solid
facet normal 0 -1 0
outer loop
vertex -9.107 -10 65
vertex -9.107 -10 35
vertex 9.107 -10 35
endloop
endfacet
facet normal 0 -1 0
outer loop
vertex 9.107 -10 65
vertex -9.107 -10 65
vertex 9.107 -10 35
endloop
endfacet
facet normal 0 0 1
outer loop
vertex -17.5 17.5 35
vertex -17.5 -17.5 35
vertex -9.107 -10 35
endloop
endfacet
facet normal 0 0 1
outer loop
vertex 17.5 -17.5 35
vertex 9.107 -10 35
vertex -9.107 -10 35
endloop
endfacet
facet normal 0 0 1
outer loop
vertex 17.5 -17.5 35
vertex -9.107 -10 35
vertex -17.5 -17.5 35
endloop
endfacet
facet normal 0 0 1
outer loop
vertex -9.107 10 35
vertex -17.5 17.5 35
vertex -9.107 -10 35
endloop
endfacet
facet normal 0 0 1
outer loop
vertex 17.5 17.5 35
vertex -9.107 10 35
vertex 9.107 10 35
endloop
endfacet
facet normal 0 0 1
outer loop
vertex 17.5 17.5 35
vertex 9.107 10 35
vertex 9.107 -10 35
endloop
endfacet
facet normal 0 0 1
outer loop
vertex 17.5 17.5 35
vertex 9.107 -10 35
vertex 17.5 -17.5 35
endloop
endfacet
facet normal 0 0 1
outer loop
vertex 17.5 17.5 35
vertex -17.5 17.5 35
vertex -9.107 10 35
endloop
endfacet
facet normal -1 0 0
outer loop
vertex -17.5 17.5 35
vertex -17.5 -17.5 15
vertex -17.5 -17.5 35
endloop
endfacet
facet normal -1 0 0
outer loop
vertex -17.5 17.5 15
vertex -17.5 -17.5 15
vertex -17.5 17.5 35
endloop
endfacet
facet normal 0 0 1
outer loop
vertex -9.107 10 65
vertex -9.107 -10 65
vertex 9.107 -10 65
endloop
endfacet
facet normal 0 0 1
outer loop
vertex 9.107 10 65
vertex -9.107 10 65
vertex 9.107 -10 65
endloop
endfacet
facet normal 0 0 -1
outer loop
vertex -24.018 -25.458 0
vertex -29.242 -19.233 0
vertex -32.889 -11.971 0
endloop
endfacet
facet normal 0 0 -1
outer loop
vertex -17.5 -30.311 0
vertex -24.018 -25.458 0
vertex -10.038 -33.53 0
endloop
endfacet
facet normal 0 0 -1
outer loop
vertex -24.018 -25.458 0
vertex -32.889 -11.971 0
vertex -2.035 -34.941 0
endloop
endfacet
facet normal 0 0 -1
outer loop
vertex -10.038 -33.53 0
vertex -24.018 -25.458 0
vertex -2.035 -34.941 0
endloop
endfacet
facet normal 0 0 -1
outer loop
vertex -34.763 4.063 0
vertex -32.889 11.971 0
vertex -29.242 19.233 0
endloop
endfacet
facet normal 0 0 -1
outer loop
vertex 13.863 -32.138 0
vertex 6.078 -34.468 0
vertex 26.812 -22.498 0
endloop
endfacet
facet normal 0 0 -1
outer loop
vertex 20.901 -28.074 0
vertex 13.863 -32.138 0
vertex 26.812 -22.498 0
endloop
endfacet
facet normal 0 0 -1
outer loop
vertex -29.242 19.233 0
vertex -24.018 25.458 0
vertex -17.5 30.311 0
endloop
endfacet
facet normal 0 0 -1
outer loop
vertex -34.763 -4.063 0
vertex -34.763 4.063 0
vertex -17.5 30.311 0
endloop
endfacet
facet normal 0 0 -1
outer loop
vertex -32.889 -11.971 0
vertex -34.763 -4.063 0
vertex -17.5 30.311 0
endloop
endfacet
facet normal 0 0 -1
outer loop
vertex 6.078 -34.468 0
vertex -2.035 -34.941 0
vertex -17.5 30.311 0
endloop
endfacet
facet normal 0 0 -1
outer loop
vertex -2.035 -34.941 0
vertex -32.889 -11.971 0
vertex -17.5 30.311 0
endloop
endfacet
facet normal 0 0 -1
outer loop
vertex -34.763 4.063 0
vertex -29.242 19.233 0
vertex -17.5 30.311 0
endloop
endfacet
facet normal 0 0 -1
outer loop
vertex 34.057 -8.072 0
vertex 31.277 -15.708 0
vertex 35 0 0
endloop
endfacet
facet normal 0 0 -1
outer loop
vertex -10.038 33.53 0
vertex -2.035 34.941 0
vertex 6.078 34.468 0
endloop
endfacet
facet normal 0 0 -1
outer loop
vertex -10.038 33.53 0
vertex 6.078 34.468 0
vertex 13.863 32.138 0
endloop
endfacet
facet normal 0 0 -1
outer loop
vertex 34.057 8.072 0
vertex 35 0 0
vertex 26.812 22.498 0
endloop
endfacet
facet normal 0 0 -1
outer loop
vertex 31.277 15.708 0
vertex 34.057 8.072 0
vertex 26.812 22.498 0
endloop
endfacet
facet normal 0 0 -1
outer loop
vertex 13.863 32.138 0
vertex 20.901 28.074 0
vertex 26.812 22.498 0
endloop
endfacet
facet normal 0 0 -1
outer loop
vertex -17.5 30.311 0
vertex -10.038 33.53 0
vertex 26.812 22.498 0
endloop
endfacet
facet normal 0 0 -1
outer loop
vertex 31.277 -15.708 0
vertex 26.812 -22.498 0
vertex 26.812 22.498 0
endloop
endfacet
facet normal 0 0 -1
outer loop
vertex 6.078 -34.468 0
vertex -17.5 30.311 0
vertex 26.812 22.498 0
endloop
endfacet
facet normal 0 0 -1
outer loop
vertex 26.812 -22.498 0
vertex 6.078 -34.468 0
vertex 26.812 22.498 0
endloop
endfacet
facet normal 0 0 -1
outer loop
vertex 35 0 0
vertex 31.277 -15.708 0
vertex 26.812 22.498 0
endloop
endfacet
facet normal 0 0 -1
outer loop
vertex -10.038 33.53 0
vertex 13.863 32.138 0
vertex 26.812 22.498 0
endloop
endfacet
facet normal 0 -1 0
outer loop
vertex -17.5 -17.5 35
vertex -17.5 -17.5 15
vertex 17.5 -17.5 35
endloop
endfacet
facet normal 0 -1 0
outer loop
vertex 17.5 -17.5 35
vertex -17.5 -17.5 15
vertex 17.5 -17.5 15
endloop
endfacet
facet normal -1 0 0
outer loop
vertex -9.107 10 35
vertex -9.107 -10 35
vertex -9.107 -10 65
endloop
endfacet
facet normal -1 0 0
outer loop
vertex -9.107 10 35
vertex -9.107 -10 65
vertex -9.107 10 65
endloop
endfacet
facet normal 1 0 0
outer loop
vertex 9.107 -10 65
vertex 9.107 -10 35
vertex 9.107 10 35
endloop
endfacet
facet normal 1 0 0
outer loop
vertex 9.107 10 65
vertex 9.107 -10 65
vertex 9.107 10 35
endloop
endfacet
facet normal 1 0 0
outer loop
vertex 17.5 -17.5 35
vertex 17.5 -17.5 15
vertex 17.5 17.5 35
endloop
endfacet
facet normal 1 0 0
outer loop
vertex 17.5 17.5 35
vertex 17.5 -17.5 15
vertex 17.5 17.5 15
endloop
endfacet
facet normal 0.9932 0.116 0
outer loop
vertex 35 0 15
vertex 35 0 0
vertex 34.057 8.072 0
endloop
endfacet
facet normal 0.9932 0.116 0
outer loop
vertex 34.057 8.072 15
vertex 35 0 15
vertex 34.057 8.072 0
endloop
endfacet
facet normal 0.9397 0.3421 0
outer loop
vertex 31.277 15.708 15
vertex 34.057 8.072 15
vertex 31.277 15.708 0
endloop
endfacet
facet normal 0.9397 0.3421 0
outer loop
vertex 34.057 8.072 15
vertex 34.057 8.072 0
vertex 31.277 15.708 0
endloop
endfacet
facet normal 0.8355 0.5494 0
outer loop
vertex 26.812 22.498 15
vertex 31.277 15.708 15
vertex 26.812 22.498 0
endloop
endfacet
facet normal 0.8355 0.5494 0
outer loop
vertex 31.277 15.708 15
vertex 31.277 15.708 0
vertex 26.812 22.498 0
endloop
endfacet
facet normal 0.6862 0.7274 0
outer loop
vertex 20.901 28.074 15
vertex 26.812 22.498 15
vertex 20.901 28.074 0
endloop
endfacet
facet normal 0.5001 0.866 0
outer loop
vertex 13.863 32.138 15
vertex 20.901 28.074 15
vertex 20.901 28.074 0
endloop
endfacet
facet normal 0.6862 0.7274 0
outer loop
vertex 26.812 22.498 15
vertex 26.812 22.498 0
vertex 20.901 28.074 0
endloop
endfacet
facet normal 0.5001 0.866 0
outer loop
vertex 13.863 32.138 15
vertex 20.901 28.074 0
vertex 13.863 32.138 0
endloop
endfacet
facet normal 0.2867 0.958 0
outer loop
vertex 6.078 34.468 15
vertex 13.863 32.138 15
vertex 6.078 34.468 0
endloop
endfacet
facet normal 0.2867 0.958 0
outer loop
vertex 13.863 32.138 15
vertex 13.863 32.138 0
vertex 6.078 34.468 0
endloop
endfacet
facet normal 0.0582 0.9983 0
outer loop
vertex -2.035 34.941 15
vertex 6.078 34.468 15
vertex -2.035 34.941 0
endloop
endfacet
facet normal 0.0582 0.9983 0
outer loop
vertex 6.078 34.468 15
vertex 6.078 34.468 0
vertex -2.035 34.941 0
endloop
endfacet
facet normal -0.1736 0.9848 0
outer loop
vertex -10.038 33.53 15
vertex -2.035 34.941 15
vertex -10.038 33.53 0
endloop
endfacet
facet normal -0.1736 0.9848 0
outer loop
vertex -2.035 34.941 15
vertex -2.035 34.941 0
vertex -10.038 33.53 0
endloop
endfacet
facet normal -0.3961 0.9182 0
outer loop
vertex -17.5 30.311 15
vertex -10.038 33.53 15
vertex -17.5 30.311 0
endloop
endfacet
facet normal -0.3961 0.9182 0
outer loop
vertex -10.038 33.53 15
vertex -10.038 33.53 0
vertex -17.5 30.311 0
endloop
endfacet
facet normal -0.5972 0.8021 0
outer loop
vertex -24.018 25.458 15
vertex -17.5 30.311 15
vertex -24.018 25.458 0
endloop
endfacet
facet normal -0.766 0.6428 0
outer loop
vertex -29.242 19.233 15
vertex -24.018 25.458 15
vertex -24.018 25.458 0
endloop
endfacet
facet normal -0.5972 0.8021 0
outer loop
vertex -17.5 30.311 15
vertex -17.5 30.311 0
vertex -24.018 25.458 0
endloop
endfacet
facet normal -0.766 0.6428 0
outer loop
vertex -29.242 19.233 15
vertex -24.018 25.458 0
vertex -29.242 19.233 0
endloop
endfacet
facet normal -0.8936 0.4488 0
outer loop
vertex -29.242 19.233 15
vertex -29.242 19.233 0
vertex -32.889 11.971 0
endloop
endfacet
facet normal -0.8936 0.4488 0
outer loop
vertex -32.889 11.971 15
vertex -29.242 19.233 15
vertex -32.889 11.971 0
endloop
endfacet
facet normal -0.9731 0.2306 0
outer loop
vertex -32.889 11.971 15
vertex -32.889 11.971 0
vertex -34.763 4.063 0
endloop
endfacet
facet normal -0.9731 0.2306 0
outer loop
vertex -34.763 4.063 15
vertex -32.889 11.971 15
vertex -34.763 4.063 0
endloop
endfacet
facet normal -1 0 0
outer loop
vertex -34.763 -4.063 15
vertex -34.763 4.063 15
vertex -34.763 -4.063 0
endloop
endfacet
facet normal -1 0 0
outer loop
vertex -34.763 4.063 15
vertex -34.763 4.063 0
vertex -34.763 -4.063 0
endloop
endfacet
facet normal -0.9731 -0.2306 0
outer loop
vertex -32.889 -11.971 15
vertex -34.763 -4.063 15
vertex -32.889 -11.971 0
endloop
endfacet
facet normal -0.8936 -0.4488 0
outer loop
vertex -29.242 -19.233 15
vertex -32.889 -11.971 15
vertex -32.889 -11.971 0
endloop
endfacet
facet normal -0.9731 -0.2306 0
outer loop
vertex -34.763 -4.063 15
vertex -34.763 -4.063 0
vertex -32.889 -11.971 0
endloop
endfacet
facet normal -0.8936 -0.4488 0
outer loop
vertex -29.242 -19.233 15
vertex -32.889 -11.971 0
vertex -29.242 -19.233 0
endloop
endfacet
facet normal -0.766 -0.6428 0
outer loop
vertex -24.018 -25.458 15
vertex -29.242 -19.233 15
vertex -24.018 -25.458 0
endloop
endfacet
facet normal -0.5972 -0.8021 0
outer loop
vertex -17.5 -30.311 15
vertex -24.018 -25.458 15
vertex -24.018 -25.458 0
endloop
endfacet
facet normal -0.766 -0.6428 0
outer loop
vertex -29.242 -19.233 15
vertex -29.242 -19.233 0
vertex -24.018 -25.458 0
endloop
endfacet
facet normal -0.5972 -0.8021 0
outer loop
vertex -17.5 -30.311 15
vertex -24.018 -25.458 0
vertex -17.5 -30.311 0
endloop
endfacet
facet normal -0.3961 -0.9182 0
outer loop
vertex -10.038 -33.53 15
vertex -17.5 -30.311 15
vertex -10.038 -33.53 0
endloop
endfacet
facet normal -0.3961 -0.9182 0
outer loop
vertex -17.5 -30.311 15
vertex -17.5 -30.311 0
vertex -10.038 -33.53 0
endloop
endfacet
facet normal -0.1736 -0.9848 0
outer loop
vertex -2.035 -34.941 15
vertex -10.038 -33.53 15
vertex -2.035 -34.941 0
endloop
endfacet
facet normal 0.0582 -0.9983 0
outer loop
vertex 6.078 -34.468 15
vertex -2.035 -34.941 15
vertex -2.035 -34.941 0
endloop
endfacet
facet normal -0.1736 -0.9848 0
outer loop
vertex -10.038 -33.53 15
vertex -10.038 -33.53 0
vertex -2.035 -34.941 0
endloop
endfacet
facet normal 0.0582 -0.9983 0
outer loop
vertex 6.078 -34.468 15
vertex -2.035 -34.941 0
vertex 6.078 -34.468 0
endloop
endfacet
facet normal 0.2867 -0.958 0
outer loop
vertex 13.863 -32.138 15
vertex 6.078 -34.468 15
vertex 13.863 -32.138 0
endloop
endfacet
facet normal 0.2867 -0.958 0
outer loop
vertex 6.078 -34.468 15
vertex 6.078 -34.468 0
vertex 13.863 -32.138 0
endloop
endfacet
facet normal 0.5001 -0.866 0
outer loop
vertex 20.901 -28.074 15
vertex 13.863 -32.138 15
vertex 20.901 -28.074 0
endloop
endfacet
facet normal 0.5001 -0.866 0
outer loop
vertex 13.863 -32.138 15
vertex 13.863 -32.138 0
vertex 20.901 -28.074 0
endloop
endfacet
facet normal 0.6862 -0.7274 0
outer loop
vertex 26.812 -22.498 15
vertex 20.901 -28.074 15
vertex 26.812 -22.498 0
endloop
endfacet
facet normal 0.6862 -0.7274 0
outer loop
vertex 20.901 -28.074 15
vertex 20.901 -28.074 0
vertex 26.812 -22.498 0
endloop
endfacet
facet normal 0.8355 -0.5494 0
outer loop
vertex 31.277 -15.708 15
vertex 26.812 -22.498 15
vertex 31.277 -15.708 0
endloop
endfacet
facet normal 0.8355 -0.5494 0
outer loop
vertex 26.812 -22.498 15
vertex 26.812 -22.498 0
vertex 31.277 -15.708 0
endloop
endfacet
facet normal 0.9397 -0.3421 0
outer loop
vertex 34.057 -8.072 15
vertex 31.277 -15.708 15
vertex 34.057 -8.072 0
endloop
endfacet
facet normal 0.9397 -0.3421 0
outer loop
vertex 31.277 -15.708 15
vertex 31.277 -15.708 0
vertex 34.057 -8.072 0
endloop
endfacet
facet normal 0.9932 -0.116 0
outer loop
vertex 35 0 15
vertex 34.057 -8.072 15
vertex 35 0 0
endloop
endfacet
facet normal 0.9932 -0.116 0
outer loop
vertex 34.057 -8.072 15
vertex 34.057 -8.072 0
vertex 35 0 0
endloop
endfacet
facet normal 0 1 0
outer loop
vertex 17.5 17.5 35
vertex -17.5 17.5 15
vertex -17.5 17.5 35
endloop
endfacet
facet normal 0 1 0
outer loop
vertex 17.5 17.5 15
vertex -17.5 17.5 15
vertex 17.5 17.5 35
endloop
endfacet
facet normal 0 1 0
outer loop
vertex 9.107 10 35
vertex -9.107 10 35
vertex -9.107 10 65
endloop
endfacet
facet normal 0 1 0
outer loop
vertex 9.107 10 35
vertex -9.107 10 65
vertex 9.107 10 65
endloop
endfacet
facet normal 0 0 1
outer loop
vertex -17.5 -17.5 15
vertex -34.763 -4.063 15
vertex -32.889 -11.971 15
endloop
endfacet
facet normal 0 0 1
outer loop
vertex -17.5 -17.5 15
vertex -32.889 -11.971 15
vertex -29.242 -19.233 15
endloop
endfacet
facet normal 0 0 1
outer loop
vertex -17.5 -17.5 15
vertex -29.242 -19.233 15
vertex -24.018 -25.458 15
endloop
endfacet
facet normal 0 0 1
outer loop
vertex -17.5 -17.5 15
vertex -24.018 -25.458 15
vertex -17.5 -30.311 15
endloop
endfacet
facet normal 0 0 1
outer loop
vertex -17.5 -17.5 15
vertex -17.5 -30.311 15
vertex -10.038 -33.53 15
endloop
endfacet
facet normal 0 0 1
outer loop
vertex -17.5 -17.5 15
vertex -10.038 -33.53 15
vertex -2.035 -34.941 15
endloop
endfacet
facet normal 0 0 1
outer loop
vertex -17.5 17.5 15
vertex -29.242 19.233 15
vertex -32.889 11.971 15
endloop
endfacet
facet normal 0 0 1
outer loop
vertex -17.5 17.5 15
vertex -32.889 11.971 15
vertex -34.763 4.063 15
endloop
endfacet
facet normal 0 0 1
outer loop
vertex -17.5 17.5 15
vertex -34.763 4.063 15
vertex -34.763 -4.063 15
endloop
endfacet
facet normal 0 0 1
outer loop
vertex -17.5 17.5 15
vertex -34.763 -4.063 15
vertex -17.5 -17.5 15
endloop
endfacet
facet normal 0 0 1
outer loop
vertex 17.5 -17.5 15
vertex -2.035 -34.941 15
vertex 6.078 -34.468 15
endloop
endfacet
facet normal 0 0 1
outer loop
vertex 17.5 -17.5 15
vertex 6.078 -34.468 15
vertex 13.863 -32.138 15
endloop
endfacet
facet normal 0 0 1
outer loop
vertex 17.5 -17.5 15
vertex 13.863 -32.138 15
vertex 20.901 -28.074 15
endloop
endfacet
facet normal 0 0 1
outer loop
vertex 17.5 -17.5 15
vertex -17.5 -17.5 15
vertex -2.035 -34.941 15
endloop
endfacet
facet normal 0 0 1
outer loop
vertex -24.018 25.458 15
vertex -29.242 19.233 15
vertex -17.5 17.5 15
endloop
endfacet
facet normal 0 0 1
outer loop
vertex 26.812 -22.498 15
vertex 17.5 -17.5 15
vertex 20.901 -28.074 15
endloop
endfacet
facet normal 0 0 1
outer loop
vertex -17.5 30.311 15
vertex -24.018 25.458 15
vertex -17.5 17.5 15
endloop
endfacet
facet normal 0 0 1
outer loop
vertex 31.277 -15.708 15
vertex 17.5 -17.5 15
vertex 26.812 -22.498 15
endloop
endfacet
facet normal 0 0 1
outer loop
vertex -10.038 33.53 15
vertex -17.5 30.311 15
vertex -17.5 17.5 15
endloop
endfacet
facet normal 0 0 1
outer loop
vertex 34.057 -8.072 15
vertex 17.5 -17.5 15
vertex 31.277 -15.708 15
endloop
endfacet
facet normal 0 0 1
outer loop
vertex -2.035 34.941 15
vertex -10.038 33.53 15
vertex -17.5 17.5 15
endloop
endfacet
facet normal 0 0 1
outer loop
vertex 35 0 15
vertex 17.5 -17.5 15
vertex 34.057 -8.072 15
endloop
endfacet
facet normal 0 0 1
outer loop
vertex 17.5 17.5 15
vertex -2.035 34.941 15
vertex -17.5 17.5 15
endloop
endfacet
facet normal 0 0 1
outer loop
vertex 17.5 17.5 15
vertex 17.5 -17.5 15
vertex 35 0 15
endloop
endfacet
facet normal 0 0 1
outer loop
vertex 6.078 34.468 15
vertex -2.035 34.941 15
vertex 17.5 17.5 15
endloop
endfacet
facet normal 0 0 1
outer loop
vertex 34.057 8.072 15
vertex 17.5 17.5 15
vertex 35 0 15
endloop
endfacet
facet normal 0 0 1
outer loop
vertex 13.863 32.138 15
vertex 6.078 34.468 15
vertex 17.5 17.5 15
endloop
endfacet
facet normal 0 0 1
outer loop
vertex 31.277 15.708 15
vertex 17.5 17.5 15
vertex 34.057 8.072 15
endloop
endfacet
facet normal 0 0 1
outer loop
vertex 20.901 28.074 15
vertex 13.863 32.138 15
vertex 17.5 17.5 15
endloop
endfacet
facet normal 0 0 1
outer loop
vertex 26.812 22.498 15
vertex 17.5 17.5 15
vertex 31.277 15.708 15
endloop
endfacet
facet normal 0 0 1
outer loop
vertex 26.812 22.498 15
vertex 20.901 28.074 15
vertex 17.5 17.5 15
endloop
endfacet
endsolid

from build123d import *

# Parameters (mm, degrees)
F0_R     = 35
F1_DEPTH = 15
F2_W     = 35
F2_H     = 35
F3_DEPTH = 20
F4_W     = 18.214288
F4_H     = 20
F5_DEPTH = 30


with BuildPart() as f1:
    # F0 (on Top) → F1 (new body)
    with BuildSketch(Plane.XY):
        Circle(F0_R)
    extrude(amount=F1_DEPTH)

    # F2 (on face) → F3 (join)
    with BuildSketch(Plane.XY.offset(15)):
        Rectangle(F2_W, F2_H)
    extrude(amount=F3_DEPTH)

    # F4 (on face) → F5 (join)
    with BuildSketch(Plane.XY.offset(35)):
        Rectangle(F4_W, F4_H)
    extrude(amount=F5_DEPTH)


solid = f1.part
